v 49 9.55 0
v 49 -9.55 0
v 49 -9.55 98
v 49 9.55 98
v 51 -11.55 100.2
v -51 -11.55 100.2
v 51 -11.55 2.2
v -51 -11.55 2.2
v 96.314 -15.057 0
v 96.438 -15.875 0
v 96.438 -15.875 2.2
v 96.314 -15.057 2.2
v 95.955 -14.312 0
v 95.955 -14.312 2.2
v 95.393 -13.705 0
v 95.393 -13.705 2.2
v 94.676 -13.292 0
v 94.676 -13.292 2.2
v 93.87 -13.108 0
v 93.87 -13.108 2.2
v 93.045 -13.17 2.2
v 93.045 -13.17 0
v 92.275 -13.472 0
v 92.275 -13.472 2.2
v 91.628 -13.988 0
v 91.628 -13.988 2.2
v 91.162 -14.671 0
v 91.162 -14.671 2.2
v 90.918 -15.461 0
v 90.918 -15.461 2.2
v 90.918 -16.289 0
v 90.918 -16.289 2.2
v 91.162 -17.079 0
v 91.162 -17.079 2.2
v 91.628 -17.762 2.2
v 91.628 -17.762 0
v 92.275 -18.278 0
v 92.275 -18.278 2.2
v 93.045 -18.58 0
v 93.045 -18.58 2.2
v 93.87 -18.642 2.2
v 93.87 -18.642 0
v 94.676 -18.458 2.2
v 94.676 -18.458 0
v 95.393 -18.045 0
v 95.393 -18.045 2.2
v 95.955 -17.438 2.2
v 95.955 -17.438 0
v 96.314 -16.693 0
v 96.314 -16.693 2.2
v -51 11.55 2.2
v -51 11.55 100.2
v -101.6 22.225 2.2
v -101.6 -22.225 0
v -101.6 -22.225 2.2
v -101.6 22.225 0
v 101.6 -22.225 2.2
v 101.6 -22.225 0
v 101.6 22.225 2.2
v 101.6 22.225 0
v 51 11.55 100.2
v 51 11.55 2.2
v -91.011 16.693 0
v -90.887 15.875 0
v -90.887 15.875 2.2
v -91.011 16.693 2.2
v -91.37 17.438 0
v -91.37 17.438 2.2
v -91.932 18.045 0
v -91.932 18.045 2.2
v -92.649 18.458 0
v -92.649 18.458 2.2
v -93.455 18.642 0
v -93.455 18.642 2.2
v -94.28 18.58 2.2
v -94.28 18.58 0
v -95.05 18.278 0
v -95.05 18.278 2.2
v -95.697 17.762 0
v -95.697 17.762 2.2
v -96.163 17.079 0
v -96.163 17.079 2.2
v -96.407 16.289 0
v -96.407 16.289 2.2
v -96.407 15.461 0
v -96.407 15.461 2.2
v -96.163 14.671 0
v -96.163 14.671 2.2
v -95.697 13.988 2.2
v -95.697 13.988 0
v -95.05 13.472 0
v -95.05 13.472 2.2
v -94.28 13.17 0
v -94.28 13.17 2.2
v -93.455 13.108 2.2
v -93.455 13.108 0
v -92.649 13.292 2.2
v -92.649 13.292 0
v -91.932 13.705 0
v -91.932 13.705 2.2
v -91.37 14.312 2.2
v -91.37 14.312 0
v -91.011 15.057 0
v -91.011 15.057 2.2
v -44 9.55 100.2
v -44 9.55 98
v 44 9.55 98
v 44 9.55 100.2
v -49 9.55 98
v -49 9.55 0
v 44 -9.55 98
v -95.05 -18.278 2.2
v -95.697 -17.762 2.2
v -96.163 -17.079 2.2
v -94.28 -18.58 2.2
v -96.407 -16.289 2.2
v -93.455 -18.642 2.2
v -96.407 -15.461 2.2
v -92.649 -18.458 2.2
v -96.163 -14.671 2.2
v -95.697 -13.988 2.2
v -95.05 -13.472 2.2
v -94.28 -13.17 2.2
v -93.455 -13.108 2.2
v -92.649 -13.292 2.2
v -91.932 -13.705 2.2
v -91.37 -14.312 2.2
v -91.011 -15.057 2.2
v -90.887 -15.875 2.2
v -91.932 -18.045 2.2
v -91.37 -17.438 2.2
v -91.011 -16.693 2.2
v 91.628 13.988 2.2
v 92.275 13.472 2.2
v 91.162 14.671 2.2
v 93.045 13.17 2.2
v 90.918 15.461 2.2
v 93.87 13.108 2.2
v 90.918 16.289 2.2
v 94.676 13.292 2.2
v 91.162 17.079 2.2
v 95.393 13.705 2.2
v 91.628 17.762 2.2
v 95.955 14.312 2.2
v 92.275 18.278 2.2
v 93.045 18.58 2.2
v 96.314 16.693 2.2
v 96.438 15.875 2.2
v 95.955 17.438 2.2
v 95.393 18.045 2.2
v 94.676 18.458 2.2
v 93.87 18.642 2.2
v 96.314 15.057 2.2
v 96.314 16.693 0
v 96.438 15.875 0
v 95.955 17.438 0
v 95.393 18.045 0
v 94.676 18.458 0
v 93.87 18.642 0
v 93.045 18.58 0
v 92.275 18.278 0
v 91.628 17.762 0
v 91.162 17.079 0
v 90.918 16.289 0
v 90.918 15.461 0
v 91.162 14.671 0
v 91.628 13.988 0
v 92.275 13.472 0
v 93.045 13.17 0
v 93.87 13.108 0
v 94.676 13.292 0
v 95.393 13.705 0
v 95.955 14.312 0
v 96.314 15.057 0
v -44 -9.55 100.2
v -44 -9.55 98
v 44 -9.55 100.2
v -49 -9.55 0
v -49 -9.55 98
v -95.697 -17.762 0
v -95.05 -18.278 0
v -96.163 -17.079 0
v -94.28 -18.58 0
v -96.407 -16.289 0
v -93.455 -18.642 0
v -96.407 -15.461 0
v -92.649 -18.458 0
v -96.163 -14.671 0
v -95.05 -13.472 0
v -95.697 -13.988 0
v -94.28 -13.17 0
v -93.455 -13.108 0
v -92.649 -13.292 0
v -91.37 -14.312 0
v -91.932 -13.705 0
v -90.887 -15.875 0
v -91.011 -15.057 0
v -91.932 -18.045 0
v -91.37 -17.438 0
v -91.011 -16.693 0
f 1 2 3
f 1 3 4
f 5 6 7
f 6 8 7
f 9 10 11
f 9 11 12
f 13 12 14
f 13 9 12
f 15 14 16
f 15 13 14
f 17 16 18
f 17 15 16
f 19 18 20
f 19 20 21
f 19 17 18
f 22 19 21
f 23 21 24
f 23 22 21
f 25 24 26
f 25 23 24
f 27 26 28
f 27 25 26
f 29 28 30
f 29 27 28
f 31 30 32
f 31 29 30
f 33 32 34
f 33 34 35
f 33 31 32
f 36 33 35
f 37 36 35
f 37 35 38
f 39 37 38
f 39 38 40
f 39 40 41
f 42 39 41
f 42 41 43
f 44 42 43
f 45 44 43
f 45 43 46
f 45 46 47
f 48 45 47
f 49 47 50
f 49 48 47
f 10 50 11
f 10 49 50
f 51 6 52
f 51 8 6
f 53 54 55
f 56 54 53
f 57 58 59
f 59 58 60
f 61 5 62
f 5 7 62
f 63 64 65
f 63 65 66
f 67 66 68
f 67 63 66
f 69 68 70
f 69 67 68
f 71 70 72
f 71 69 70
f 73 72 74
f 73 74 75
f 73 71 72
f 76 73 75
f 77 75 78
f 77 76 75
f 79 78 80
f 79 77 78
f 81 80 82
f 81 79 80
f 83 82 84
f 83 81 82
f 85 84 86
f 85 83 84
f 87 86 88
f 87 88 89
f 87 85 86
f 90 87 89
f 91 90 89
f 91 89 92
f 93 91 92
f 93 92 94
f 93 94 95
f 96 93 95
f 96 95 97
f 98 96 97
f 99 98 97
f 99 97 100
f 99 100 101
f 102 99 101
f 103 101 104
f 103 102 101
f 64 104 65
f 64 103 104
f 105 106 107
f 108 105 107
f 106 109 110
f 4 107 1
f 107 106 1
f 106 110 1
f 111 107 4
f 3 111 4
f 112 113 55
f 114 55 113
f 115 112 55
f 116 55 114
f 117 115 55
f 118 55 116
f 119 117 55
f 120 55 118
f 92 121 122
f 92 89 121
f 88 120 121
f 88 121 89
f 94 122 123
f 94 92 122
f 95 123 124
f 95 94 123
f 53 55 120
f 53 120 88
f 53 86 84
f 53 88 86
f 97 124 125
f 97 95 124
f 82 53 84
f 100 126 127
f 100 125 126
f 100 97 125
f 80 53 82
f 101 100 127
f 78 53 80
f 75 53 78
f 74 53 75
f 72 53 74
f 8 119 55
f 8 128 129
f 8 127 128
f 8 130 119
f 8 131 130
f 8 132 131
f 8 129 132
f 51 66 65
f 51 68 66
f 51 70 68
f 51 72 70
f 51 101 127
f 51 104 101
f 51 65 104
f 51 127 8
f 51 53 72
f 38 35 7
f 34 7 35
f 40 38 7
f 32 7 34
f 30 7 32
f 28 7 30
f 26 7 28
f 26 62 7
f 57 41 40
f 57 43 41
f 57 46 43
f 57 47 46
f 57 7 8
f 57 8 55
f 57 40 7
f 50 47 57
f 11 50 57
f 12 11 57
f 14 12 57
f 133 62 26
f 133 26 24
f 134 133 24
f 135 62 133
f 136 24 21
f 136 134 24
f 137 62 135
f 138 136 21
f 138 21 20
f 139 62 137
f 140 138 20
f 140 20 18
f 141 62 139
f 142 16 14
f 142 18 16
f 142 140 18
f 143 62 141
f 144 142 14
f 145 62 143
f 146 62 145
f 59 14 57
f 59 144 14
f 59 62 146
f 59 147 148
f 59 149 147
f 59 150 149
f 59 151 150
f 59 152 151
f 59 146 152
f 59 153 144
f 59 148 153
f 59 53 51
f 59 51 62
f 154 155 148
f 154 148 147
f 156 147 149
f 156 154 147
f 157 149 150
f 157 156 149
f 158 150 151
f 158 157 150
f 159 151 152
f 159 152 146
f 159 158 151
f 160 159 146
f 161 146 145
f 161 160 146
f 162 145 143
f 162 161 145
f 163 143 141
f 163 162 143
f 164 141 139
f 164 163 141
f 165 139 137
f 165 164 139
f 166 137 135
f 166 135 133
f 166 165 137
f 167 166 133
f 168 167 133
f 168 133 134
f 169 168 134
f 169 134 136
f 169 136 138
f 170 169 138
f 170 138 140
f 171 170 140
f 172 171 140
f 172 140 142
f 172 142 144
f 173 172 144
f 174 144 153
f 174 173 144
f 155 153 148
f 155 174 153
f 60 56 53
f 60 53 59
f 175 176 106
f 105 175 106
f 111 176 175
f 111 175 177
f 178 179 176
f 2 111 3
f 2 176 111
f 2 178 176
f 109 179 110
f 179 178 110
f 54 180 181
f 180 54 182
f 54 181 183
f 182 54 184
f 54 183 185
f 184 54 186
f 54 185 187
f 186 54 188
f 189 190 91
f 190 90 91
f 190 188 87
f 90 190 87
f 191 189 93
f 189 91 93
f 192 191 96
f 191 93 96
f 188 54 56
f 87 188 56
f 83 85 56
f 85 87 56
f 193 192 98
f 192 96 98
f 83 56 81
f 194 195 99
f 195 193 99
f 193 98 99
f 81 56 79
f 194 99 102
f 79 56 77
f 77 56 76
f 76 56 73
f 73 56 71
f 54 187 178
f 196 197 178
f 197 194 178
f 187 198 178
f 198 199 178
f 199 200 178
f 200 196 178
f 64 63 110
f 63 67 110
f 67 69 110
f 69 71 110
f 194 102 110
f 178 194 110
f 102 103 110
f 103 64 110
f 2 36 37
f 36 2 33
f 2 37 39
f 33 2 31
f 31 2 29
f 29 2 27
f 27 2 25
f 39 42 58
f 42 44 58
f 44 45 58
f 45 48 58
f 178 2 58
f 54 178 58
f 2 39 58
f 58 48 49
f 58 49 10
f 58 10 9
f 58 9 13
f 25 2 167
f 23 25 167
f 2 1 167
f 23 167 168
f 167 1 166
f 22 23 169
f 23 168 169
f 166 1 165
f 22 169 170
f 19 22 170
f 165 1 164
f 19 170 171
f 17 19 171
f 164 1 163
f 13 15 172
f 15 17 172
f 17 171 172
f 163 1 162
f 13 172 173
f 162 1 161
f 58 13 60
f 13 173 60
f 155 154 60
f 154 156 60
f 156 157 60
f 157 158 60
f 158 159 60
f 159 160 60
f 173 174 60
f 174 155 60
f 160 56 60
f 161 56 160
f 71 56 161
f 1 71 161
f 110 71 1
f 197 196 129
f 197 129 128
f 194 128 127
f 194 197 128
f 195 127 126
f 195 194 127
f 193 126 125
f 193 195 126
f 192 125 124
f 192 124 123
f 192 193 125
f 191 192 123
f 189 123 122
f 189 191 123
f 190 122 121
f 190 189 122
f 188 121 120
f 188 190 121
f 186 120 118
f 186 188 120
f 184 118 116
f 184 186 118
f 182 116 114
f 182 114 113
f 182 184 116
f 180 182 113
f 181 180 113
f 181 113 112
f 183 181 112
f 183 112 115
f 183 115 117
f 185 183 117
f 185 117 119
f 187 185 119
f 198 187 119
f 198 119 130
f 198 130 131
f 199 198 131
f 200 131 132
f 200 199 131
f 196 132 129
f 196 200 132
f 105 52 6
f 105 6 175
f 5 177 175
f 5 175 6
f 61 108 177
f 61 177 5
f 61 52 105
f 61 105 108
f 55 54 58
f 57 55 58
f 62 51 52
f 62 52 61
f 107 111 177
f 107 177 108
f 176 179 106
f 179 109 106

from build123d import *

# Parameters (mm, degrees)
SKETCH_W      = 203.2
SKETCH_H      = 44.45
SKETCH_R      = 2.775
SKETCH_W_2    = 98
SKETCH_H_2    = 19.1
PAD_DEPTH     = 2.2
SKETCH001_W   = 102
SKETCH001_H   = 23.1
SKETCH001_W_2 = 98
SKETCH001_H_2 = 19.1
PAD001_DEPTH  = 95.8
SKETCH002_W   = 102
SKETCH002_H   = 23.1
SKETCH002_W_2 = 88
SKETCH002_H_2 = 19.1
PAD002_DEPTH  = 2.2


with BuildPart() as part:
    # Sketch → Pad (new body)
    with BuildSketch(Plane.XY):
        Rectangle(SKETCH_W, SKETCH_H)
        with Locations((-93.6625, 15.875)):
            Circle(SKETCH_R, mode=Mode.SUBTRACT)
        with Locations((-93.6625, -15.875)):
            Circle(SKETCH_R, mode=Mode.SUBTRACT)
        with Locations((93.6625, 15.875)):
            Circle(SKETCH_R, mode=Mode.SUBTRACT)
        with Locations((93.6625, -15.875)):
            Circle(SKETCH_R, mode=Mode.SUBTRACT)
        Rectangle(SKETCH_W_2, SKETCH_H_2, mode=Mode.SUBTRACT)
    extrude(amount=PAD_DEPTH)

    # Sketch001 (on Face14 of Pad) → Pad001 (join)
    with BuildSketch(Plane.XY.offset(2.2)):
        Rectangle(SKETCH001_W, SKETCH001_H)
        Rectangle(SKETCH001_W_2, SKETCH001_H_2, mode=Mode.SUBTRACT)
    extrude(amount=PAD001_DEPTH)

    # Sketch002 (on Face23 of Pad001) → Pad002 (join)
    with BuildSketch(Plane.XY.offset(98)):
        Rectangle(SKETCH002_W, SKETCH002_H)
        Rectangle(SKETCH002_W_2, SKETCH002_H_2, mode=Mode.SUBTRACT)
    extrude(amount=PAD002_DEPTH)


solid = part.part
